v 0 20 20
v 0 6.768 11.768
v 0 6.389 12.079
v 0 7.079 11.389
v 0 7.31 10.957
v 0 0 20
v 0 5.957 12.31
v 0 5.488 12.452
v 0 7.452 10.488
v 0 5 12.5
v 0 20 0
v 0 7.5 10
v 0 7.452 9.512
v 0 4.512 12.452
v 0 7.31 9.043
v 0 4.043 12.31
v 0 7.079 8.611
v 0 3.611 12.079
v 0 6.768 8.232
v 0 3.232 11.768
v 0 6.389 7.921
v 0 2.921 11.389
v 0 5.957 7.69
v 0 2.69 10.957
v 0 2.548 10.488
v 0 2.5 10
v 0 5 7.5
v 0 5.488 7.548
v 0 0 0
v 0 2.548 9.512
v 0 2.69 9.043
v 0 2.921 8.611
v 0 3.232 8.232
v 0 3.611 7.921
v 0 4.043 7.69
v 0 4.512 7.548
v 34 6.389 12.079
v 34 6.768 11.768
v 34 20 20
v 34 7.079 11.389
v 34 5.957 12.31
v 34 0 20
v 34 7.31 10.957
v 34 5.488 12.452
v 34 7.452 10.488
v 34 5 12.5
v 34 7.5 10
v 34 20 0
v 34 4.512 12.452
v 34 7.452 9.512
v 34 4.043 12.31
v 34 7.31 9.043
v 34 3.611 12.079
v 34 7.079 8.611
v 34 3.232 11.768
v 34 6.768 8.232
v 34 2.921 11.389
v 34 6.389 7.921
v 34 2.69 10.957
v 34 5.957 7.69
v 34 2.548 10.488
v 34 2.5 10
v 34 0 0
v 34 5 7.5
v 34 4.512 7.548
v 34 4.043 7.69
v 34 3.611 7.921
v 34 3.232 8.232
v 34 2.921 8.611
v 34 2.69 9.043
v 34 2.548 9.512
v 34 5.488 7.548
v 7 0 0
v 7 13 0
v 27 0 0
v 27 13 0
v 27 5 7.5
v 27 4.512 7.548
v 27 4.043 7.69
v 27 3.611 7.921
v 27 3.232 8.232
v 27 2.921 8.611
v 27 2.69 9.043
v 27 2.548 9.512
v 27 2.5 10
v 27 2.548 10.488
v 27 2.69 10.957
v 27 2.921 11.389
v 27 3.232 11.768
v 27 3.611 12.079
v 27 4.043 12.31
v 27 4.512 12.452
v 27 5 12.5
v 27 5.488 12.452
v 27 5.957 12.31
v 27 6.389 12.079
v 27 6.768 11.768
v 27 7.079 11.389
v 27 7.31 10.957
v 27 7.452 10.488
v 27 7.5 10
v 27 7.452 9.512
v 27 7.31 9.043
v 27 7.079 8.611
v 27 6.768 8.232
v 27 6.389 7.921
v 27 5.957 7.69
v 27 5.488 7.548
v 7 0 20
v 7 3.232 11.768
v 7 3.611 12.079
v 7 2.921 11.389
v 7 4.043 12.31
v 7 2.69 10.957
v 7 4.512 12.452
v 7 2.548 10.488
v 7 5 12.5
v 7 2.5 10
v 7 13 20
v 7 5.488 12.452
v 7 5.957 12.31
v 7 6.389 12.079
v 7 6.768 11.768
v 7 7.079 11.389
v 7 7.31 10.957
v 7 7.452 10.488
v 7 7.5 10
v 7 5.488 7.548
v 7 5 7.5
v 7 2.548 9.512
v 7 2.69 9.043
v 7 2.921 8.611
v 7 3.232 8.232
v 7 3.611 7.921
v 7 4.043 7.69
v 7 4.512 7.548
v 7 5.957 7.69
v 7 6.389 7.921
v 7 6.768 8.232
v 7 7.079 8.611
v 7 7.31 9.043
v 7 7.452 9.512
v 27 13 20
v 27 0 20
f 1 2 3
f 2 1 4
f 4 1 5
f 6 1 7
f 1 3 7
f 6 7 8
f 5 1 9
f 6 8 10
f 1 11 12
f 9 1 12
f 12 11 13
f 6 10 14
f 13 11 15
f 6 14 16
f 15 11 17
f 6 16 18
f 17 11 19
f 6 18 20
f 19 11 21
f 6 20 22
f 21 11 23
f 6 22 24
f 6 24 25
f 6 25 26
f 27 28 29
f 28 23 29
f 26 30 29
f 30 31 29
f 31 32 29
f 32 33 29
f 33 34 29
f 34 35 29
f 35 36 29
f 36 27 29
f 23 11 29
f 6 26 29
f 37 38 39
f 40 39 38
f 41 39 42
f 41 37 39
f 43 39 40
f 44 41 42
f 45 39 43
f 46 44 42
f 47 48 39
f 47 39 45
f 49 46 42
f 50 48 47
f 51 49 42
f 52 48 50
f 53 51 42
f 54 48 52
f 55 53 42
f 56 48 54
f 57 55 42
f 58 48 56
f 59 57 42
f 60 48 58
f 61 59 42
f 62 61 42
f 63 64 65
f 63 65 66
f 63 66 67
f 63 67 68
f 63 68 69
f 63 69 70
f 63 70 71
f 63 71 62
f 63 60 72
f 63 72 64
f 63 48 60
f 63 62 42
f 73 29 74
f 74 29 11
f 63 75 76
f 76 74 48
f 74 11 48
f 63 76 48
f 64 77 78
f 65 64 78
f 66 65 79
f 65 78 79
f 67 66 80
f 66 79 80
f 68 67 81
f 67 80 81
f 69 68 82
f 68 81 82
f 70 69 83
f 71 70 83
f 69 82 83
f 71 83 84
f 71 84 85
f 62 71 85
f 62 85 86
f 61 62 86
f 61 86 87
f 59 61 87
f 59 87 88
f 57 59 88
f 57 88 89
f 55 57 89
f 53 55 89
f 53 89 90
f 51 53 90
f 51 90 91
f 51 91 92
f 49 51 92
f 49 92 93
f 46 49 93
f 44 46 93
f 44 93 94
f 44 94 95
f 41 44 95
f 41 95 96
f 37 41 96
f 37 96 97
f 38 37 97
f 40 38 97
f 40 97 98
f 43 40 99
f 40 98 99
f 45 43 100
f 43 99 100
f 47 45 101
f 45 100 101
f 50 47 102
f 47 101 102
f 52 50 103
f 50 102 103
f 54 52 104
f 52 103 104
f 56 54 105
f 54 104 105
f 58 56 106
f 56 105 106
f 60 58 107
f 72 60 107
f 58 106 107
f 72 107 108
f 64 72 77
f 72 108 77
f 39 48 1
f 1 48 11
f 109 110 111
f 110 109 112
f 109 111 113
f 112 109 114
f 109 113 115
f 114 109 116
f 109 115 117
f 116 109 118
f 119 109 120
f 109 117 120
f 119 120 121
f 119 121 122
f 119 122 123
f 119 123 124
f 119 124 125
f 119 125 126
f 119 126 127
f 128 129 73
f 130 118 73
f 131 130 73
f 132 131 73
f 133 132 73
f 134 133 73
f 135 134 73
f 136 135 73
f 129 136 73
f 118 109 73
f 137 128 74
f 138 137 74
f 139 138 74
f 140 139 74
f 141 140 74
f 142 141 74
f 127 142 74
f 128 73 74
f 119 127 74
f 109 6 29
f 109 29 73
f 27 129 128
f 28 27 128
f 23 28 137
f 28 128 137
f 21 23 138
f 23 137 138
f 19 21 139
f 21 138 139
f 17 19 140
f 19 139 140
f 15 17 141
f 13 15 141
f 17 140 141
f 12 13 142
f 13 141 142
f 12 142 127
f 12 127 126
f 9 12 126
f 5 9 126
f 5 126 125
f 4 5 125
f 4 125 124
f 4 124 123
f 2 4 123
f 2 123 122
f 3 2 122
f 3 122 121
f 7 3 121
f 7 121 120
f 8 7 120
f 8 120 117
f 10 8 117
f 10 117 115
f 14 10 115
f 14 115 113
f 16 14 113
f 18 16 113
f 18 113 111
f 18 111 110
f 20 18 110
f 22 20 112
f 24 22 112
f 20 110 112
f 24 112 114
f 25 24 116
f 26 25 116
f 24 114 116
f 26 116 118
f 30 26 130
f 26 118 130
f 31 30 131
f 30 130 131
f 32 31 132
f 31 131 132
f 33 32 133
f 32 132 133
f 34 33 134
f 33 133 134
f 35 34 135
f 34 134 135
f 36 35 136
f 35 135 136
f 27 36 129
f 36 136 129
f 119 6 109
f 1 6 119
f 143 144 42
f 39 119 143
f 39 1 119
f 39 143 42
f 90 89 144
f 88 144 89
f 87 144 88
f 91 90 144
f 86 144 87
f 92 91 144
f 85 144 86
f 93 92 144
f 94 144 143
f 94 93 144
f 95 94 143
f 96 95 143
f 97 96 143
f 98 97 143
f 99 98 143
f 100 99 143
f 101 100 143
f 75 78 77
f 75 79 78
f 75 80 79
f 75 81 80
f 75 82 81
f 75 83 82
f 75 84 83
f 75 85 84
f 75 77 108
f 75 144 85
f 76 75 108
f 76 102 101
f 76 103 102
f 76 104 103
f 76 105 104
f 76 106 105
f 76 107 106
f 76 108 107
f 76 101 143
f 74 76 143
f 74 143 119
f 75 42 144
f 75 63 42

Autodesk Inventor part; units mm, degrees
ref_plane "YZ Plane" through (0, 0, 0) normal (1, 0, 0) x (0, 1, 0)
ref_plane "XZ Plane" through (0, 0, 0) normal (0, 1, 0) x (-1, 0, 0)
ref_plane "XY Plane" through (0, 0, 0) normal (0, 0, 1) x (1, 0, 0)
sketch "Sketch1" plane through (0, 0, 0) normal (0, 0, 1) x (1, 0, 0)
  line L0 (0, 0) -> (7, 0)
  line L1 (7, 0) -> (7, 20)
  line L2 (7, 20) -> (0, 20)
  line L3 (0, 20) -> (0, 0)
  line L4 (7, 20) -> (27, 20)
  line L5 (27, 20) -> (27, 13)
  line L6 (27, 13) -> (7, 13)
  line L7 (7, 13) -> (7, 20)
  line L8 (27, 20) -> (34, 20)
  line L9 (34, 20) -> (34, 0)
  line L10 (34, 0) -> (27, 0)
  line L11 (27, 0) -> (27, 20)
  dimension "d0" = 34
  dimension "d1" = 7
  dimension "d2" = 7
  dimension "d3" = 7
  dimension "d4" = 13
extrude "Extrusion1" add sketch "Sketch1" along normal blind 20
sketch "Sketch2" plane through (7, 0, 0) normal (1, 0, 0) x (0, 0, -1)
  circle A0 centre (-10, 5) radius 2.5
  line L0 (-20, 0) -> (-20, 20) projected
  line L1 (0, 0) -> (-20, 0) projected
  dimension "d7" = 5
  dimension "d8" = 10
  dimension "d9" = 5
extrude "Extrusion2" cut sketch "Sketch2" along normal blind 60 and the other way blind 10
properties part number "FanSpace"
